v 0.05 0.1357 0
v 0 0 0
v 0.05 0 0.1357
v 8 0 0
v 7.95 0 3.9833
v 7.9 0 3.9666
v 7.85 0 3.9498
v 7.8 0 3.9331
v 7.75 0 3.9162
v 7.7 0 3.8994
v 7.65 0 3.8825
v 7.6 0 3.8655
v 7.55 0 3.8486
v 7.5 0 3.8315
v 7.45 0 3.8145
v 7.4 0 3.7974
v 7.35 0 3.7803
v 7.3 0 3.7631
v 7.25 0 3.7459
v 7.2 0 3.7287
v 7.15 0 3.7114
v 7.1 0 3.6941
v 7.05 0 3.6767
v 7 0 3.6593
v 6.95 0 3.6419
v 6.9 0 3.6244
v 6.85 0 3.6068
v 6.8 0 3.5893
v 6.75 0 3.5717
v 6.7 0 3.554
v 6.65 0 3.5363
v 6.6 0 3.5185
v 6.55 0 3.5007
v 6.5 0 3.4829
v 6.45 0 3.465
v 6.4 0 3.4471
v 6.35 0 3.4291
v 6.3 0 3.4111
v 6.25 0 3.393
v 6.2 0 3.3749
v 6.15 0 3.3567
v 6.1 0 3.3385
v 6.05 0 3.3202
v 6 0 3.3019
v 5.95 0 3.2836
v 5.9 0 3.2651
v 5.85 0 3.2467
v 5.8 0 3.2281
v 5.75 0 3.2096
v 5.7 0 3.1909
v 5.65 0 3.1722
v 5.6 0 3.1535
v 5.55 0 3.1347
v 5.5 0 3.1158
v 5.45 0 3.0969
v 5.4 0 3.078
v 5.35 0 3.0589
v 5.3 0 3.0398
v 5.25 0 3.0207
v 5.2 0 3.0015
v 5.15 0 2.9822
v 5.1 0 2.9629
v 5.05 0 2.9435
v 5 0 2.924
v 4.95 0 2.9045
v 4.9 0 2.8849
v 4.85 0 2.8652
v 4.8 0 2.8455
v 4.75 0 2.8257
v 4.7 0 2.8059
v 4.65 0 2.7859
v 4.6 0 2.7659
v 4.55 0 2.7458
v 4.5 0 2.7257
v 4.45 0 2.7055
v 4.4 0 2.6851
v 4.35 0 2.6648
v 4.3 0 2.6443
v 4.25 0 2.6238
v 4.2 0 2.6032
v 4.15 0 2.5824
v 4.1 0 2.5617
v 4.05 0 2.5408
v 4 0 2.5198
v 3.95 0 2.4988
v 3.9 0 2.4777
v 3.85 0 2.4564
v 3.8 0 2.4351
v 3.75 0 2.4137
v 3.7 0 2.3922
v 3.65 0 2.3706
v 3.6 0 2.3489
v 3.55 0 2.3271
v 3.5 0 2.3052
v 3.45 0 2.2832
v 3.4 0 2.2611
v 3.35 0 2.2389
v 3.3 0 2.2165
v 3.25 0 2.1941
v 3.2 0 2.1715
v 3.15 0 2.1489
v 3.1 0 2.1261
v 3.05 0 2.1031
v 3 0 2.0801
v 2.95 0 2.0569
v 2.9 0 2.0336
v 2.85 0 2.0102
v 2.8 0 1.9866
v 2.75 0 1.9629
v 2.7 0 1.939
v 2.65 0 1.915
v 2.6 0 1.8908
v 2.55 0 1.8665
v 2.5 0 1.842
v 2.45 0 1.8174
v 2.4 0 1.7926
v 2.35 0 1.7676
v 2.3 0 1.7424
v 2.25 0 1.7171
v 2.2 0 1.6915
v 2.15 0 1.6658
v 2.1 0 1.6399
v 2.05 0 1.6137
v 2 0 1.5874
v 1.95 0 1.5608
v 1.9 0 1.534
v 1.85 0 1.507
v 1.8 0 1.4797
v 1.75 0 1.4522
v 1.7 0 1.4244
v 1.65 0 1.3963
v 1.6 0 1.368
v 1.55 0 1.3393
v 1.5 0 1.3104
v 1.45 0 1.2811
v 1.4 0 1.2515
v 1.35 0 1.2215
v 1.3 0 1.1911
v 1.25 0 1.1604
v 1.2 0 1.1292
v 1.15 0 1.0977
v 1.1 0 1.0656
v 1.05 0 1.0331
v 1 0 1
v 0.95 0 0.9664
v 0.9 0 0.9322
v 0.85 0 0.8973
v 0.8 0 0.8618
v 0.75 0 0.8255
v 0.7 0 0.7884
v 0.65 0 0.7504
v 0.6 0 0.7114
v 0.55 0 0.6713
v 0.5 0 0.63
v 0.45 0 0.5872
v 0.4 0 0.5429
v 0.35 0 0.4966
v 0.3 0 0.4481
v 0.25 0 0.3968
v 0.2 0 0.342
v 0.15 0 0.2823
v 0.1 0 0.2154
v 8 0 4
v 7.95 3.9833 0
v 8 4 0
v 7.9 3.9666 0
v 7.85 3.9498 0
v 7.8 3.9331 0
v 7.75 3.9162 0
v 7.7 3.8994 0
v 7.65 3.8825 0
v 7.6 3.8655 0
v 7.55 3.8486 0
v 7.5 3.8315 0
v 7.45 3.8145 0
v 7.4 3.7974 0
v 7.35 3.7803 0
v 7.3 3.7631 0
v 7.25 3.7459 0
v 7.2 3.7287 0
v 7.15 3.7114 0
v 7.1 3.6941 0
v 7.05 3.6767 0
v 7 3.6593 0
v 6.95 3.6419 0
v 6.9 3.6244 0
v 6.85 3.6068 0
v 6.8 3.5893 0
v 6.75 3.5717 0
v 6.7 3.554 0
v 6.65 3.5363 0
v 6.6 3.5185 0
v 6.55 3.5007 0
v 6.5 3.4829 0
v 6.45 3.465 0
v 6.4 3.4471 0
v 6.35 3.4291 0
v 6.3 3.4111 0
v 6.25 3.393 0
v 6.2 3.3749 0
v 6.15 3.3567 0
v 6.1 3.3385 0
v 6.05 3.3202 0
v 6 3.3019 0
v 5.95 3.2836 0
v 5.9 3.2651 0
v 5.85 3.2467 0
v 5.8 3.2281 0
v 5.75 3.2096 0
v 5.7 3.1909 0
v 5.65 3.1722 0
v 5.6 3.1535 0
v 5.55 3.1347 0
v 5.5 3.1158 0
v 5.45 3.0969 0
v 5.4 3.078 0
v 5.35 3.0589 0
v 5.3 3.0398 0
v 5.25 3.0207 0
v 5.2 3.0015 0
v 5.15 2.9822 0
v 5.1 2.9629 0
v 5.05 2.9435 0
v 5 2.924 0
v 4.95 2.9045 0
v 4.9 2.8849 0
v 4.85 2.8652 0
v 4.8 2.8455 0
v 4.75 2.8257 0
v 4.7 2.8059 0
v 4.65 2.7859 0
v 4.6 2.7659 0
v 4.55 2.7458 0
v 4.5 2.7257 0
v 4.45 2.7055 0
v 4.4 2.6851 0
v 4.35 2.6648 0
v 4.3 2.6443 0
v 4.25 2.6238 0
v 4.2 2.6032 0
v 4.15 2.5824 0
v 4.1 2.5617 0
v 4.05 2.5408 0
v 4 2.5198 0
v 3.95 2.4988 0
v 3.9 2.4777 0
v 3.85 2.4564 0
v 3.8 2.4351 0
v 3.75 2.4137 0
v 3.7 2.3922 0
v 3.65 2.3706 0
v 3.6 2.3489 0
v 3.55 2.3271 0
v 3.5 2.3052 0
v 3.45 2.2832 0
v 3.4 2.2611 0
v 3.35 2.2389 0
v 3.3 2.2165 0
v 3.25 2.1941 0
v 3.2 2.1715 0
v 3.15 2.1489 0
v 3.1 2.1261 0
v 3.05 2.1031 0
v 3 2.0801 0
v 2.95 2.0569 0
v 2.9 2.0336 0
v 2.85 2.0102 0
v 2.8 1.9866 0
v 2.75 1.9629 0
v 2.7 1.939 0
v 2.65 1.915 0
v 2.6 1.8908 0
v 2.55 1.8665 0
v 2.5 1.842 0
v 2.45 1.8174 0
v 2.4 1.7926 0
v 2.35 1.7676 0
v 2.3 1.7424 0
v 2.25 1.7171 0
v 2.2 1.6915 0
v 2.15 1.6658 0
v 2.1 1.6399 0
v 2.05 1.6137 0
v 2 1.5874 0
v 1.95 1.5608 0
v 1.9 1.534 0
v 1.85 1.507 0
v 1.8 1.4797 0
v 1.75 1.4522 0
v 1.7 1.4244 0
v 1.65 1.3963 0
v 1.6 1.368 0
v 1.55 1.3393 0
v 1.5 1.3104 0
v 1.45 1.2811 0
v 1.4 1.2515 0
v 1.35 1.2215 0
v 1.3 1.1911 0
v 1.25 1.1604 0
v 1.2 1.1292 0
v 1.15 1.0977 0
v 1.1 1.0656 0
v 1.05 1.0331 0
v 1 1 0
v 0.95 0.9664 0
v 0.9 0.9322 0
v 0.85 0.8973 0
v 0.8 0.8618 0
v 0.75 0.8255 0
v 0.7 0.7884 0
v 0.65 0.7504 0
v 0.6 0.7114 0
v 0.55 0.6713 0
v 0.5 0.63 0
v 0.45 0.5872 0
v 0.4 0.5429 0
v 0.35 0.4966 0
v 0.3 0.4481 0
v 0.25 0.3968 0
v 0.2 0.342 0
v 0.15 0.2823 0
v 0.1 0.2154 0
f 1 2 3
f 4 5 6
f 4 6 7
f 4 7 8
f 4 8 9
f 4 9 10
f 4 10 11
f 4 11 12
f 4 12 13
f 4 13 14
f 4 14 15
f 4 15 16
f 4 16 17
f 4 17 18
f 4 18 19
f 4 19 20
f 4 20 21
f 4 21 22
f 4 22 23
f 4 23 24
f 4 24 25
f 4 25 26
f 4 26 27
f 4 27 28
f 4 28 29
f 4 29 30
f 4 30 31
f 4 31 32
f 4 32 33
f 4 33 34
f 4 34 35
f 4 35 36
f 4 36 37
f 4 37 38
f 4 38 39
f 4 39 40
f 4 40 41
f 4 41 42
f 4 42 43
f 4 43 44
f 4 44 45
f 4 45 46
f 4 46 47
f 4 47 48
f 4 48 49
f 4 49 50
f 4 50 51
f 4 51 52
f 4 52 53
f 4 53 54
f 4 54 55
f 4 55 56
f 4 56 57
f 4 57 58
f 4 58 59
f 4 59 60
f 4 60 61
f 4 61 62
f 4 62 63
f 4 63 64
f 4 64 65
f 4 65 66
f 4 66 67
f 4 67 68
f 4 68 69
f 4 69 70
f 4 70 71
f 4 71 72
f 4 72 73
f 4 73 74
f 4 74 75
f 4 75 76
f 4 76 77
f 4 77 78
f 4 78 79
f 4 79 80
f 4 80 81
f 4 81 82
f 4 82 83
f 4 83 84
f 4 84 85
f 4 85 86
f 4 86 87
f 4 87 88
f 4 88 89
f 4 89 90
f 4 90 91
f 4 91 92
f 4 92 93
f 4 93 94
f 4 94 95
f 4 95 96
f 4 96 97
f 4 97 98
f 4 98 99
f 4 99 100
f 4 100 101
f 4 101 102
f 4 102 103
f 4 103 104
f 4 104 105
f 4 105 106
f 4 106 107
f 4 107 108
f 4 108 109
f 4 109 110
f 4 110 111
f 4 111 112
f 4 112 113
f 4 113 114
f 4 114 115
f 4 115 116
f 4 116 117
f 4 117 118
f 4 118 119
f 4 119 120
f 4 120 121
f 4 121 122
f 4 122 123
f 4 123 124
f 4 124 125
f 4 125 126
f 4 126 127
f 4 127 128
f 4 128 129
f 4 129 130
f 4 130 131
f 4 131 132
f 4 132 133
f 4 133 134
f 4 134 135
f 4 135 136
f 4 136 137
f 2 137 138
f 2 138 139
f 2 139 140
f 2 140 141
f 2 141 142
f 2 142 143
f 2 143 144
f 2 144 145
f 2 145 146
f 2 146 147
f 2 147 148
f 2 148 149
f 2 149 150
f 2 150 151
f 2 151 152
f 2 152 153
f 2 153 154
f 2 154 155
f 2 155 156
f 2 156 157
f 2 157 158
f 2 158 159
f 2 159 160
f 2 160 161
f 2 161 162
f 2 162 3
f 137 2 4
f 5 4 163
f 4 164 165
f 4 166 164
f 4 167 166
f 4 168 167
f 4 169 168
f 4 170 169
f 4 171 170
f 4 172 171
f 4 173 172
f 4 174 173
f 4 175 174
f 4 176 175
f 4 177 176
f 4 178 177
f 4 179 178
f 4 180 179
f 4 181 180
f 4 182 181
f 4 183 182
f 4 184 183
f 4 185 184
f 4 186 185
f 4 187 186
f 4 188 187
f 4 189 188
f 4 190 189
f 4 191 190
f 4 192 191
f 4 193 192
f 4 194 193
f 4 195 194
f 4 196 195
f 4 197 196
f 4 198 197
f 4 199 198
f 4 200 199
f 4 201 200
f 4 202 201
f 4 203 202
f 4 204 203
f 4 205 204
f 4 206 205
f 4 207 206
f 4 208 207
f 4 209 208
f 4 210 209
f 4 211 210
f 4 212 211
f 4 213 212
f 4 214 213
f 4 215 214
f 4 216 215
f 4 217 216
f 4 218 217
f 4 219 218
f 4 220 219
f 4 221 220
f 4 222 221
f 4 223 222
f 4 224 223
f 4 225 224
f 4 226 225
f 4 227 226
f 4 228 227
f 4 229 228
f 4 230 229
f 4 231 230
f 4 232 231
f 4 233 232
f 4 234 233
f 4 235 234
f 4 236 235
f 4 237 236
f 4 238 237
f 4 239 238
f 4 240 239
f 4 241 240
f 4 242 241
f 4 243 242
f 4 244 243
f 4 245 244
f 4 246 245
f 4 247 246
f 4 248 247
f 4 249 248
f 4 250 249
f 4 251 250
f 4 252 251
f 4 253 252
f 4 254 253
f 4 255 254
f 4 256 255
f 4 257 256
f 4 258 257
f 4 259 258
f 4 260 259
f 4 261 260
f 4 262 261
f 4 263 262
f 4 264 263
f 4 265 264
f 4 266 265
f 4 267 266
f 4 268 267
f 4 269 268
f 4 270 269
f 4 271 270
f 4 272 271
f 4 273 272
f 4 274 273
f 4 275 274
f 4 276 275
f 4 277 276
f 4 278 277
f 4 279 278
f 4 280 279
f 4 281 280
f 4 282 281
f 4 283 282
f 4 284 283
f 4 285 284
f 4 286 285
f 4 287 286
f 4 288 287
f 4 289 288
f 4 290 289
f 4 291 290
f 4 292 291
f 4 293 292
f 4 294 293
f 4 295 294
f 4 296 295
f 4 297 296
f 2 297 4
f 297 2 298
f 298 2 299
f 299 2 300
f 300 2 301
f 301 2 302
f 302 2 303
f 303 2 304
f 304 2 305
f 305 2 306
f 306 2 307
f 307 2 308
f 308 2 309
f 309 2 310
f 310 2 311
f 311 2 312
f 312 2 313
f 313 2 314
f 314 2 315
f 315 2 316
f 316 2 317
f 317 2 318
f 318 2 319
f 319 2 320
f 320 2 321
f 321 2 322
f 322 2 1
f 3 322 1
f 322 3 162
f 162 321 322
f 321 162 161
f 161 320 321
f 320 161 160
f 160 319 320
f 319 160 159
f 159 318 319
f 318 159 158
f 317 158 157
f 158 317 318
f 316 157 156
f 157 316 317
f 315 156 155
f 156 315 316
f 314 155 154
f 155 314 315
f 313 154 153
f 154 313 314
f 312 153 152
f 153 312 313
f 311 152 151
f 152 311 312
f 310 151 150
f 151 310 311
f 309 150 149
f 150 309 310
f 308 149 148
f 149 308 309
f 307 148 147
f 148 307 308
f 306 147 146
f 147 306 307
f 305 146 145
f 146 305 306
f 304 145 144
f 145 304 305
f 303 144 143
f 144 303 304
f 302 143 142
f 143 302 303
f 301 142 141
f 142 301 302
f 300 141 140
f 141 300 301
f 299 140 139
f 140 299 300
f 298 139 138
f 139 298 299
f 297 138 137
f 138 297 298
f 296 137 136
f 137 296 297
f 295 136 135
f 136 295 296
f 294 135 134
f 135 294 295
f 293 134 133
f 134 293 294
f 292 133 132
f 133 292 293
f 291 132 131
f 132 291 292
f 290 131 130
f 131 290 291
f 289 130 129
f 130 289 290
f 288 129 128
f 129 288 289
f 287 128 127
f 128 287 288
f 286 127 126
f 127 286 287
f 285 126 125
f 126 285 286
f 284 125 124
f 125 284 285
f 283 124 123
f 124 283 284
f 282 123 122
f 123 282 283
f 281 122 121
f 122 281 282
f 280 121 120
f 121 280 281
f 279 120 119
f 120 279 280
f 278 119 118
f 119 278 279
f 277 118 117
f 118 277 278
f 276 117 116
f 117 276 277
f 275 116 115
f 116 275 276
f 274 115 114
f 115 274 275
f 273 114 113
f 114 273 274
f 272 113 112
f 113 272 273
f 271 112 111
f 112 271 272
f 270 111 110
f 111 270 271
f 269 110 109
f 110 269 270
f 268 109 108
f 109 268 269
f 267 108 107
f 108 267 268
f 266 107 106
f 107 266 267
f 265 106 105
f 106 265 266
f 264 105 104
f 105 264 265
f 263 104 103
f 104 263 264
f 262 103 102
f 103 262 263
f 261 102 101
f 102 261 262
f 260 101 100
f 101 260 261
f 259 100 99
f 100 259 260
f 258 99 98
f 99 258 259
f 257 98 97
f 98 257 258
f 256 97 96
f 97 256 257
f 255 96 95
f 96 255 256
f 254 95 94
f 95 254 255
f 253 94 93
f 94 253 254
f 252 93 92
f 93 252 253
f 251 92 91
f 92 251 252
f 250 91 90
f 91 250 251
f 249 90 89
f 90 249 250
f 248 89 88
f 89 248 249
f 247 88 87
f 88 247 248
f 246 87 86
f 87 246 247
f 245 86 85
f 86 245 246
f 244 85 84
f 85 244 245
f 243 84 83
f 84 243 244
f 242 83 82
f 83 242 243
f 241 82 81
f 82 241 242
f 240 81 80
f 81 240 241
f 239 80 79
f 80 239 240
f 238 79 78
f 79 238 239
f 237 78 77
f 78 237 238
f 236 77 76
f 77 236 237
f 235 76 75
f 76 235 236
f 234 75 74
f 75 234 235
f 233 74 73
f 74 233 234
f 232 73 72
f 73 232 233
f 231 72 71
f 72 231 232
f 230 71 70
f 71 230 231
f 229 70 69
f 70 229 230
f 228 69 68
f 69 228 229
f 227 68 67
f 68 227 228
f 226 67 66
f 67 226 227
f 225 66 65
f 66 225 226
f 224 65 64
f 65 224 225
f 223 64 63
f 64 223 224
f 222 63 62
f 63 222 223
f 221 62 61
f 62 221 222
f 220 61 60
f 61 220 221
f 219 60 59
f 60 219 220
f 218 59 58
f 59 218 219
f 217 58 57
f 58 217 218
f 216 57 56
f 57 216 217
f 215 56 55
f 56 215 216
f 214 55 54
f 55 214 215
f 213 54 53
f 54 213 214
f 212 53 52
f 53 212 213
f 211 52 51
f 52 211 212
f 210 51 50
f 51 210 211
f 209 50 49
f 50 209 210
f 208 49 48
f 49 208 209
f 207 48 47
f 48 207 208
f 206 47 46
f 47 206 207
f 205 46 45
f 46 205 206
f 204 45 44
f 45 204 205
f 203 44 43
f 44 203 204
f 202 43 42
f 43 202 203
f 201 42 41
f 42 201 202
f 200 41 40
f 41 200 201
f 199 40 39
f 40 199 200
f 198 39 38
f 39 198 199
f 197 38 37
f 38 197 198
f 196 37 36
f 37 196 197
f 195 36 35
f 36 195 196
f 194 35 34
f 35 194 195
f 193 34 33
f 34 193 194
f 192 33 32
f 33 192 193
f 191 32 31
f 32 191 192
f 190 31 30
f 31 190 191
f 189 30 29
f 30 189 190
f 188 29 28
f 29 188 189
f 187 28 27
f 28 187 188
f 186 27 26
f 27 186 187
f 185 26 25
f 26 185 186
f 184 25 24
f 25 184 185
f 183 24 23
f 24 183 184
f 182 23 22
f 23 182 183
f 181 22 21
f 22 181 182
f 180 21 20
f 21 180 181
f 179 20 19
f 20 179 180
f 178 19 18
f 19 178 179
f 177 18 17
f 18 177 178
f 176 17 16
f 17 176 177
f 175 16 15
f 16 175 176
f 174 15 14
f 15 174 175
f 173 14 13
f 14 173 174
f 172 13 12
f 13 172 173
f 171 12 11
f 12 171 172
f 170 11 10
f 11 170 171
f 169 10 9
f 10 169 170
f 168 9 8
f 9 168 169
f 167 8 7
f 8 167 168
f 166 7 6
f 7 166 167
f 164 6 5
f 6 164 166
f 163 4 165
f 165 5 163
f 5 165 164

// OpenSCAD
// Models 3D objects by taking a 2D base (defined by two functions and two x values), slicing it up perpendicular to the X-axis, and using the resulting line as a base for another 2D object.
// The slices are trapazoidal approximations with adjustable width.
// It can also rotate about the X- and Y-axis.


// starting x value
StartX = 0;
// ending x value
EndX = 8;
// size of slice
StepX = 0.05;


// f(x) and g(x) are functions.
// Math functions can be found here:
// https://openscad.org/cheatsheet
function f(x) = x^(2/3);
function g(x) = 0;


// "Slice" should be a list of points of [y,z].  These are the slices.
// It will later be scaled so that difference between f(x) and g(x) is 1, and translated so that [0,0] is on the line f(x).
// This means that any shape with a flat base will start off with "Slice = [[0,0], [1,0], ..."
// Also, please contain the y values to between 0 and 1.
// ...or you could just use one of these pre-made ones by uncommenting it and commenting out the rest.
// (Comments are denoted by the "//" at the beginning of the line.)

// semicircle
//Slice = [for(a = [0:1:180]) [(cos(a)/2)+0.5, (sin(a)/2)]];

// circle (not rotation)
//Slice = [for(a = [0:1:360]) [(cos(a)/2)+0.5, (sin(a)/2)]];

// isosceles right triangle with leg on base(right angle closest to x axis)
Slice = [[0,0], [1,0], [0,1]];

// isosceles right triangle with leg on base(right angle farthest from x axis)
//Slice = [[0,0], [1,0], [1,1]];

// isosceles right triangle with hypotenuse on base
//Slice = [[0,0], [1,0], [0.5,0.5]];

// equilateral triangle
//Slice = [[0,0], [1,0], [0.5,(3^(1/2))/2]];

// square
//Slice = [[0,0], [1,0], [1,1], [0,1]];


// This should be "true" or "false".  If it is "false", it does regular slices.  If it is "true", it rotates about an axis.
// Note: If you rotate, neither of the functions can be negative.
Rotation = false;

// This is for rotation, the number of sides the circle has.  If it is "false", sets it to OpenSCAD's default value.
NumberOfSteps = 100;

// If it is "true", it will rotate around the X-Axis. If it is "false", it will rotate around the Y-Axis
XAxisRotation = false;


// That's it! Everything else is code that doesn't need to change.
// If you are having problems you could try:
// https://openscad.org/cheatsheet
// https://en.wikibooks.org/wiki/OpenSCAD_User_Manual
// or me: rfboerwinkle@gmail.com


// P.S. If you want holes, you can use this "Paths" variable.  You can learn more in the user manual.
Paths = false;

if(Rotation){
	polygonpoints = [for (x = [StartX:StepX:EndX]) [x,f(x)], for (x = [EndX:-StepX:StartX]) [x,g(x)]];
	if(XAxisRotation){
		rotate(a = [0,-90,0])
		rotate_extrude($fn = NumberOfSteps)
		rotate(a = [0,0,-90])
		polygon(points = polygonpoints);
	}else{
		rotate(a = [-90,0,0])
		rotate_extrude($fn = NumberOfSteps)
		polygon(points = polygonpoints);
	}
}else{
	pointlist = [for (x = [StartX:StepX:EndX]) [x, (f(x)>g(x)?f(x):g(x)), (f(x)>g(x)?g(x):f(x))]];
	for(i = [1:len(pointlist)-1]){
		if((pointlist[i][1] - pointlist[i][2]) != 0){
			scalefactor = (pointlist[i-1][1] - pointlist[i-1][2]) / (pointlist[i][1] - pointlist[i][2]);
			distance = (scalefactor == 0) ? -pointlist[i-1][1] : (((pointlist[i][2] - pointlist[i-1][2]) / (1-scalefactor)) - pointlist[i][2]);
			rotate(a = [90,0,90])
			mirror(v = [0,0,1])
			translate(v = [-distance,0,-pointlist[i][0]])
			linear_extrude(height = StepX, scale = scalefactor, slices = 1)
			translate(v = [distance,0,0])
			translate(v = [pointlist[i][2],0,0])
			resize([(pointlist[i][1] - pointlist[i][2]),0,0], auto=true)
			polygon(points = Slice, paths = Paths);
			if(i+1 < len(pointlist) && (pointlist[i+1][1] - pointlist[i+1][2]) == 0){
				rotate(a = [90,0,90])
				mirror(v = [0,0,1])
				translate(v = [-distance,0,-pointlist[i][0]])
				mirror(v = [0,0,1])
				linear_extrude(height = StepX, scale = 0, slices = 1)
				translate(v = [distance,0,0])
				translate(v = [pointlist[i][2],0,0])
				resize([(pointlist[i][1] - pointlist[i][2]),0,0], auto=true)
				polygon(points = Slice, paths = Paths);
			}
		}
	}
}
